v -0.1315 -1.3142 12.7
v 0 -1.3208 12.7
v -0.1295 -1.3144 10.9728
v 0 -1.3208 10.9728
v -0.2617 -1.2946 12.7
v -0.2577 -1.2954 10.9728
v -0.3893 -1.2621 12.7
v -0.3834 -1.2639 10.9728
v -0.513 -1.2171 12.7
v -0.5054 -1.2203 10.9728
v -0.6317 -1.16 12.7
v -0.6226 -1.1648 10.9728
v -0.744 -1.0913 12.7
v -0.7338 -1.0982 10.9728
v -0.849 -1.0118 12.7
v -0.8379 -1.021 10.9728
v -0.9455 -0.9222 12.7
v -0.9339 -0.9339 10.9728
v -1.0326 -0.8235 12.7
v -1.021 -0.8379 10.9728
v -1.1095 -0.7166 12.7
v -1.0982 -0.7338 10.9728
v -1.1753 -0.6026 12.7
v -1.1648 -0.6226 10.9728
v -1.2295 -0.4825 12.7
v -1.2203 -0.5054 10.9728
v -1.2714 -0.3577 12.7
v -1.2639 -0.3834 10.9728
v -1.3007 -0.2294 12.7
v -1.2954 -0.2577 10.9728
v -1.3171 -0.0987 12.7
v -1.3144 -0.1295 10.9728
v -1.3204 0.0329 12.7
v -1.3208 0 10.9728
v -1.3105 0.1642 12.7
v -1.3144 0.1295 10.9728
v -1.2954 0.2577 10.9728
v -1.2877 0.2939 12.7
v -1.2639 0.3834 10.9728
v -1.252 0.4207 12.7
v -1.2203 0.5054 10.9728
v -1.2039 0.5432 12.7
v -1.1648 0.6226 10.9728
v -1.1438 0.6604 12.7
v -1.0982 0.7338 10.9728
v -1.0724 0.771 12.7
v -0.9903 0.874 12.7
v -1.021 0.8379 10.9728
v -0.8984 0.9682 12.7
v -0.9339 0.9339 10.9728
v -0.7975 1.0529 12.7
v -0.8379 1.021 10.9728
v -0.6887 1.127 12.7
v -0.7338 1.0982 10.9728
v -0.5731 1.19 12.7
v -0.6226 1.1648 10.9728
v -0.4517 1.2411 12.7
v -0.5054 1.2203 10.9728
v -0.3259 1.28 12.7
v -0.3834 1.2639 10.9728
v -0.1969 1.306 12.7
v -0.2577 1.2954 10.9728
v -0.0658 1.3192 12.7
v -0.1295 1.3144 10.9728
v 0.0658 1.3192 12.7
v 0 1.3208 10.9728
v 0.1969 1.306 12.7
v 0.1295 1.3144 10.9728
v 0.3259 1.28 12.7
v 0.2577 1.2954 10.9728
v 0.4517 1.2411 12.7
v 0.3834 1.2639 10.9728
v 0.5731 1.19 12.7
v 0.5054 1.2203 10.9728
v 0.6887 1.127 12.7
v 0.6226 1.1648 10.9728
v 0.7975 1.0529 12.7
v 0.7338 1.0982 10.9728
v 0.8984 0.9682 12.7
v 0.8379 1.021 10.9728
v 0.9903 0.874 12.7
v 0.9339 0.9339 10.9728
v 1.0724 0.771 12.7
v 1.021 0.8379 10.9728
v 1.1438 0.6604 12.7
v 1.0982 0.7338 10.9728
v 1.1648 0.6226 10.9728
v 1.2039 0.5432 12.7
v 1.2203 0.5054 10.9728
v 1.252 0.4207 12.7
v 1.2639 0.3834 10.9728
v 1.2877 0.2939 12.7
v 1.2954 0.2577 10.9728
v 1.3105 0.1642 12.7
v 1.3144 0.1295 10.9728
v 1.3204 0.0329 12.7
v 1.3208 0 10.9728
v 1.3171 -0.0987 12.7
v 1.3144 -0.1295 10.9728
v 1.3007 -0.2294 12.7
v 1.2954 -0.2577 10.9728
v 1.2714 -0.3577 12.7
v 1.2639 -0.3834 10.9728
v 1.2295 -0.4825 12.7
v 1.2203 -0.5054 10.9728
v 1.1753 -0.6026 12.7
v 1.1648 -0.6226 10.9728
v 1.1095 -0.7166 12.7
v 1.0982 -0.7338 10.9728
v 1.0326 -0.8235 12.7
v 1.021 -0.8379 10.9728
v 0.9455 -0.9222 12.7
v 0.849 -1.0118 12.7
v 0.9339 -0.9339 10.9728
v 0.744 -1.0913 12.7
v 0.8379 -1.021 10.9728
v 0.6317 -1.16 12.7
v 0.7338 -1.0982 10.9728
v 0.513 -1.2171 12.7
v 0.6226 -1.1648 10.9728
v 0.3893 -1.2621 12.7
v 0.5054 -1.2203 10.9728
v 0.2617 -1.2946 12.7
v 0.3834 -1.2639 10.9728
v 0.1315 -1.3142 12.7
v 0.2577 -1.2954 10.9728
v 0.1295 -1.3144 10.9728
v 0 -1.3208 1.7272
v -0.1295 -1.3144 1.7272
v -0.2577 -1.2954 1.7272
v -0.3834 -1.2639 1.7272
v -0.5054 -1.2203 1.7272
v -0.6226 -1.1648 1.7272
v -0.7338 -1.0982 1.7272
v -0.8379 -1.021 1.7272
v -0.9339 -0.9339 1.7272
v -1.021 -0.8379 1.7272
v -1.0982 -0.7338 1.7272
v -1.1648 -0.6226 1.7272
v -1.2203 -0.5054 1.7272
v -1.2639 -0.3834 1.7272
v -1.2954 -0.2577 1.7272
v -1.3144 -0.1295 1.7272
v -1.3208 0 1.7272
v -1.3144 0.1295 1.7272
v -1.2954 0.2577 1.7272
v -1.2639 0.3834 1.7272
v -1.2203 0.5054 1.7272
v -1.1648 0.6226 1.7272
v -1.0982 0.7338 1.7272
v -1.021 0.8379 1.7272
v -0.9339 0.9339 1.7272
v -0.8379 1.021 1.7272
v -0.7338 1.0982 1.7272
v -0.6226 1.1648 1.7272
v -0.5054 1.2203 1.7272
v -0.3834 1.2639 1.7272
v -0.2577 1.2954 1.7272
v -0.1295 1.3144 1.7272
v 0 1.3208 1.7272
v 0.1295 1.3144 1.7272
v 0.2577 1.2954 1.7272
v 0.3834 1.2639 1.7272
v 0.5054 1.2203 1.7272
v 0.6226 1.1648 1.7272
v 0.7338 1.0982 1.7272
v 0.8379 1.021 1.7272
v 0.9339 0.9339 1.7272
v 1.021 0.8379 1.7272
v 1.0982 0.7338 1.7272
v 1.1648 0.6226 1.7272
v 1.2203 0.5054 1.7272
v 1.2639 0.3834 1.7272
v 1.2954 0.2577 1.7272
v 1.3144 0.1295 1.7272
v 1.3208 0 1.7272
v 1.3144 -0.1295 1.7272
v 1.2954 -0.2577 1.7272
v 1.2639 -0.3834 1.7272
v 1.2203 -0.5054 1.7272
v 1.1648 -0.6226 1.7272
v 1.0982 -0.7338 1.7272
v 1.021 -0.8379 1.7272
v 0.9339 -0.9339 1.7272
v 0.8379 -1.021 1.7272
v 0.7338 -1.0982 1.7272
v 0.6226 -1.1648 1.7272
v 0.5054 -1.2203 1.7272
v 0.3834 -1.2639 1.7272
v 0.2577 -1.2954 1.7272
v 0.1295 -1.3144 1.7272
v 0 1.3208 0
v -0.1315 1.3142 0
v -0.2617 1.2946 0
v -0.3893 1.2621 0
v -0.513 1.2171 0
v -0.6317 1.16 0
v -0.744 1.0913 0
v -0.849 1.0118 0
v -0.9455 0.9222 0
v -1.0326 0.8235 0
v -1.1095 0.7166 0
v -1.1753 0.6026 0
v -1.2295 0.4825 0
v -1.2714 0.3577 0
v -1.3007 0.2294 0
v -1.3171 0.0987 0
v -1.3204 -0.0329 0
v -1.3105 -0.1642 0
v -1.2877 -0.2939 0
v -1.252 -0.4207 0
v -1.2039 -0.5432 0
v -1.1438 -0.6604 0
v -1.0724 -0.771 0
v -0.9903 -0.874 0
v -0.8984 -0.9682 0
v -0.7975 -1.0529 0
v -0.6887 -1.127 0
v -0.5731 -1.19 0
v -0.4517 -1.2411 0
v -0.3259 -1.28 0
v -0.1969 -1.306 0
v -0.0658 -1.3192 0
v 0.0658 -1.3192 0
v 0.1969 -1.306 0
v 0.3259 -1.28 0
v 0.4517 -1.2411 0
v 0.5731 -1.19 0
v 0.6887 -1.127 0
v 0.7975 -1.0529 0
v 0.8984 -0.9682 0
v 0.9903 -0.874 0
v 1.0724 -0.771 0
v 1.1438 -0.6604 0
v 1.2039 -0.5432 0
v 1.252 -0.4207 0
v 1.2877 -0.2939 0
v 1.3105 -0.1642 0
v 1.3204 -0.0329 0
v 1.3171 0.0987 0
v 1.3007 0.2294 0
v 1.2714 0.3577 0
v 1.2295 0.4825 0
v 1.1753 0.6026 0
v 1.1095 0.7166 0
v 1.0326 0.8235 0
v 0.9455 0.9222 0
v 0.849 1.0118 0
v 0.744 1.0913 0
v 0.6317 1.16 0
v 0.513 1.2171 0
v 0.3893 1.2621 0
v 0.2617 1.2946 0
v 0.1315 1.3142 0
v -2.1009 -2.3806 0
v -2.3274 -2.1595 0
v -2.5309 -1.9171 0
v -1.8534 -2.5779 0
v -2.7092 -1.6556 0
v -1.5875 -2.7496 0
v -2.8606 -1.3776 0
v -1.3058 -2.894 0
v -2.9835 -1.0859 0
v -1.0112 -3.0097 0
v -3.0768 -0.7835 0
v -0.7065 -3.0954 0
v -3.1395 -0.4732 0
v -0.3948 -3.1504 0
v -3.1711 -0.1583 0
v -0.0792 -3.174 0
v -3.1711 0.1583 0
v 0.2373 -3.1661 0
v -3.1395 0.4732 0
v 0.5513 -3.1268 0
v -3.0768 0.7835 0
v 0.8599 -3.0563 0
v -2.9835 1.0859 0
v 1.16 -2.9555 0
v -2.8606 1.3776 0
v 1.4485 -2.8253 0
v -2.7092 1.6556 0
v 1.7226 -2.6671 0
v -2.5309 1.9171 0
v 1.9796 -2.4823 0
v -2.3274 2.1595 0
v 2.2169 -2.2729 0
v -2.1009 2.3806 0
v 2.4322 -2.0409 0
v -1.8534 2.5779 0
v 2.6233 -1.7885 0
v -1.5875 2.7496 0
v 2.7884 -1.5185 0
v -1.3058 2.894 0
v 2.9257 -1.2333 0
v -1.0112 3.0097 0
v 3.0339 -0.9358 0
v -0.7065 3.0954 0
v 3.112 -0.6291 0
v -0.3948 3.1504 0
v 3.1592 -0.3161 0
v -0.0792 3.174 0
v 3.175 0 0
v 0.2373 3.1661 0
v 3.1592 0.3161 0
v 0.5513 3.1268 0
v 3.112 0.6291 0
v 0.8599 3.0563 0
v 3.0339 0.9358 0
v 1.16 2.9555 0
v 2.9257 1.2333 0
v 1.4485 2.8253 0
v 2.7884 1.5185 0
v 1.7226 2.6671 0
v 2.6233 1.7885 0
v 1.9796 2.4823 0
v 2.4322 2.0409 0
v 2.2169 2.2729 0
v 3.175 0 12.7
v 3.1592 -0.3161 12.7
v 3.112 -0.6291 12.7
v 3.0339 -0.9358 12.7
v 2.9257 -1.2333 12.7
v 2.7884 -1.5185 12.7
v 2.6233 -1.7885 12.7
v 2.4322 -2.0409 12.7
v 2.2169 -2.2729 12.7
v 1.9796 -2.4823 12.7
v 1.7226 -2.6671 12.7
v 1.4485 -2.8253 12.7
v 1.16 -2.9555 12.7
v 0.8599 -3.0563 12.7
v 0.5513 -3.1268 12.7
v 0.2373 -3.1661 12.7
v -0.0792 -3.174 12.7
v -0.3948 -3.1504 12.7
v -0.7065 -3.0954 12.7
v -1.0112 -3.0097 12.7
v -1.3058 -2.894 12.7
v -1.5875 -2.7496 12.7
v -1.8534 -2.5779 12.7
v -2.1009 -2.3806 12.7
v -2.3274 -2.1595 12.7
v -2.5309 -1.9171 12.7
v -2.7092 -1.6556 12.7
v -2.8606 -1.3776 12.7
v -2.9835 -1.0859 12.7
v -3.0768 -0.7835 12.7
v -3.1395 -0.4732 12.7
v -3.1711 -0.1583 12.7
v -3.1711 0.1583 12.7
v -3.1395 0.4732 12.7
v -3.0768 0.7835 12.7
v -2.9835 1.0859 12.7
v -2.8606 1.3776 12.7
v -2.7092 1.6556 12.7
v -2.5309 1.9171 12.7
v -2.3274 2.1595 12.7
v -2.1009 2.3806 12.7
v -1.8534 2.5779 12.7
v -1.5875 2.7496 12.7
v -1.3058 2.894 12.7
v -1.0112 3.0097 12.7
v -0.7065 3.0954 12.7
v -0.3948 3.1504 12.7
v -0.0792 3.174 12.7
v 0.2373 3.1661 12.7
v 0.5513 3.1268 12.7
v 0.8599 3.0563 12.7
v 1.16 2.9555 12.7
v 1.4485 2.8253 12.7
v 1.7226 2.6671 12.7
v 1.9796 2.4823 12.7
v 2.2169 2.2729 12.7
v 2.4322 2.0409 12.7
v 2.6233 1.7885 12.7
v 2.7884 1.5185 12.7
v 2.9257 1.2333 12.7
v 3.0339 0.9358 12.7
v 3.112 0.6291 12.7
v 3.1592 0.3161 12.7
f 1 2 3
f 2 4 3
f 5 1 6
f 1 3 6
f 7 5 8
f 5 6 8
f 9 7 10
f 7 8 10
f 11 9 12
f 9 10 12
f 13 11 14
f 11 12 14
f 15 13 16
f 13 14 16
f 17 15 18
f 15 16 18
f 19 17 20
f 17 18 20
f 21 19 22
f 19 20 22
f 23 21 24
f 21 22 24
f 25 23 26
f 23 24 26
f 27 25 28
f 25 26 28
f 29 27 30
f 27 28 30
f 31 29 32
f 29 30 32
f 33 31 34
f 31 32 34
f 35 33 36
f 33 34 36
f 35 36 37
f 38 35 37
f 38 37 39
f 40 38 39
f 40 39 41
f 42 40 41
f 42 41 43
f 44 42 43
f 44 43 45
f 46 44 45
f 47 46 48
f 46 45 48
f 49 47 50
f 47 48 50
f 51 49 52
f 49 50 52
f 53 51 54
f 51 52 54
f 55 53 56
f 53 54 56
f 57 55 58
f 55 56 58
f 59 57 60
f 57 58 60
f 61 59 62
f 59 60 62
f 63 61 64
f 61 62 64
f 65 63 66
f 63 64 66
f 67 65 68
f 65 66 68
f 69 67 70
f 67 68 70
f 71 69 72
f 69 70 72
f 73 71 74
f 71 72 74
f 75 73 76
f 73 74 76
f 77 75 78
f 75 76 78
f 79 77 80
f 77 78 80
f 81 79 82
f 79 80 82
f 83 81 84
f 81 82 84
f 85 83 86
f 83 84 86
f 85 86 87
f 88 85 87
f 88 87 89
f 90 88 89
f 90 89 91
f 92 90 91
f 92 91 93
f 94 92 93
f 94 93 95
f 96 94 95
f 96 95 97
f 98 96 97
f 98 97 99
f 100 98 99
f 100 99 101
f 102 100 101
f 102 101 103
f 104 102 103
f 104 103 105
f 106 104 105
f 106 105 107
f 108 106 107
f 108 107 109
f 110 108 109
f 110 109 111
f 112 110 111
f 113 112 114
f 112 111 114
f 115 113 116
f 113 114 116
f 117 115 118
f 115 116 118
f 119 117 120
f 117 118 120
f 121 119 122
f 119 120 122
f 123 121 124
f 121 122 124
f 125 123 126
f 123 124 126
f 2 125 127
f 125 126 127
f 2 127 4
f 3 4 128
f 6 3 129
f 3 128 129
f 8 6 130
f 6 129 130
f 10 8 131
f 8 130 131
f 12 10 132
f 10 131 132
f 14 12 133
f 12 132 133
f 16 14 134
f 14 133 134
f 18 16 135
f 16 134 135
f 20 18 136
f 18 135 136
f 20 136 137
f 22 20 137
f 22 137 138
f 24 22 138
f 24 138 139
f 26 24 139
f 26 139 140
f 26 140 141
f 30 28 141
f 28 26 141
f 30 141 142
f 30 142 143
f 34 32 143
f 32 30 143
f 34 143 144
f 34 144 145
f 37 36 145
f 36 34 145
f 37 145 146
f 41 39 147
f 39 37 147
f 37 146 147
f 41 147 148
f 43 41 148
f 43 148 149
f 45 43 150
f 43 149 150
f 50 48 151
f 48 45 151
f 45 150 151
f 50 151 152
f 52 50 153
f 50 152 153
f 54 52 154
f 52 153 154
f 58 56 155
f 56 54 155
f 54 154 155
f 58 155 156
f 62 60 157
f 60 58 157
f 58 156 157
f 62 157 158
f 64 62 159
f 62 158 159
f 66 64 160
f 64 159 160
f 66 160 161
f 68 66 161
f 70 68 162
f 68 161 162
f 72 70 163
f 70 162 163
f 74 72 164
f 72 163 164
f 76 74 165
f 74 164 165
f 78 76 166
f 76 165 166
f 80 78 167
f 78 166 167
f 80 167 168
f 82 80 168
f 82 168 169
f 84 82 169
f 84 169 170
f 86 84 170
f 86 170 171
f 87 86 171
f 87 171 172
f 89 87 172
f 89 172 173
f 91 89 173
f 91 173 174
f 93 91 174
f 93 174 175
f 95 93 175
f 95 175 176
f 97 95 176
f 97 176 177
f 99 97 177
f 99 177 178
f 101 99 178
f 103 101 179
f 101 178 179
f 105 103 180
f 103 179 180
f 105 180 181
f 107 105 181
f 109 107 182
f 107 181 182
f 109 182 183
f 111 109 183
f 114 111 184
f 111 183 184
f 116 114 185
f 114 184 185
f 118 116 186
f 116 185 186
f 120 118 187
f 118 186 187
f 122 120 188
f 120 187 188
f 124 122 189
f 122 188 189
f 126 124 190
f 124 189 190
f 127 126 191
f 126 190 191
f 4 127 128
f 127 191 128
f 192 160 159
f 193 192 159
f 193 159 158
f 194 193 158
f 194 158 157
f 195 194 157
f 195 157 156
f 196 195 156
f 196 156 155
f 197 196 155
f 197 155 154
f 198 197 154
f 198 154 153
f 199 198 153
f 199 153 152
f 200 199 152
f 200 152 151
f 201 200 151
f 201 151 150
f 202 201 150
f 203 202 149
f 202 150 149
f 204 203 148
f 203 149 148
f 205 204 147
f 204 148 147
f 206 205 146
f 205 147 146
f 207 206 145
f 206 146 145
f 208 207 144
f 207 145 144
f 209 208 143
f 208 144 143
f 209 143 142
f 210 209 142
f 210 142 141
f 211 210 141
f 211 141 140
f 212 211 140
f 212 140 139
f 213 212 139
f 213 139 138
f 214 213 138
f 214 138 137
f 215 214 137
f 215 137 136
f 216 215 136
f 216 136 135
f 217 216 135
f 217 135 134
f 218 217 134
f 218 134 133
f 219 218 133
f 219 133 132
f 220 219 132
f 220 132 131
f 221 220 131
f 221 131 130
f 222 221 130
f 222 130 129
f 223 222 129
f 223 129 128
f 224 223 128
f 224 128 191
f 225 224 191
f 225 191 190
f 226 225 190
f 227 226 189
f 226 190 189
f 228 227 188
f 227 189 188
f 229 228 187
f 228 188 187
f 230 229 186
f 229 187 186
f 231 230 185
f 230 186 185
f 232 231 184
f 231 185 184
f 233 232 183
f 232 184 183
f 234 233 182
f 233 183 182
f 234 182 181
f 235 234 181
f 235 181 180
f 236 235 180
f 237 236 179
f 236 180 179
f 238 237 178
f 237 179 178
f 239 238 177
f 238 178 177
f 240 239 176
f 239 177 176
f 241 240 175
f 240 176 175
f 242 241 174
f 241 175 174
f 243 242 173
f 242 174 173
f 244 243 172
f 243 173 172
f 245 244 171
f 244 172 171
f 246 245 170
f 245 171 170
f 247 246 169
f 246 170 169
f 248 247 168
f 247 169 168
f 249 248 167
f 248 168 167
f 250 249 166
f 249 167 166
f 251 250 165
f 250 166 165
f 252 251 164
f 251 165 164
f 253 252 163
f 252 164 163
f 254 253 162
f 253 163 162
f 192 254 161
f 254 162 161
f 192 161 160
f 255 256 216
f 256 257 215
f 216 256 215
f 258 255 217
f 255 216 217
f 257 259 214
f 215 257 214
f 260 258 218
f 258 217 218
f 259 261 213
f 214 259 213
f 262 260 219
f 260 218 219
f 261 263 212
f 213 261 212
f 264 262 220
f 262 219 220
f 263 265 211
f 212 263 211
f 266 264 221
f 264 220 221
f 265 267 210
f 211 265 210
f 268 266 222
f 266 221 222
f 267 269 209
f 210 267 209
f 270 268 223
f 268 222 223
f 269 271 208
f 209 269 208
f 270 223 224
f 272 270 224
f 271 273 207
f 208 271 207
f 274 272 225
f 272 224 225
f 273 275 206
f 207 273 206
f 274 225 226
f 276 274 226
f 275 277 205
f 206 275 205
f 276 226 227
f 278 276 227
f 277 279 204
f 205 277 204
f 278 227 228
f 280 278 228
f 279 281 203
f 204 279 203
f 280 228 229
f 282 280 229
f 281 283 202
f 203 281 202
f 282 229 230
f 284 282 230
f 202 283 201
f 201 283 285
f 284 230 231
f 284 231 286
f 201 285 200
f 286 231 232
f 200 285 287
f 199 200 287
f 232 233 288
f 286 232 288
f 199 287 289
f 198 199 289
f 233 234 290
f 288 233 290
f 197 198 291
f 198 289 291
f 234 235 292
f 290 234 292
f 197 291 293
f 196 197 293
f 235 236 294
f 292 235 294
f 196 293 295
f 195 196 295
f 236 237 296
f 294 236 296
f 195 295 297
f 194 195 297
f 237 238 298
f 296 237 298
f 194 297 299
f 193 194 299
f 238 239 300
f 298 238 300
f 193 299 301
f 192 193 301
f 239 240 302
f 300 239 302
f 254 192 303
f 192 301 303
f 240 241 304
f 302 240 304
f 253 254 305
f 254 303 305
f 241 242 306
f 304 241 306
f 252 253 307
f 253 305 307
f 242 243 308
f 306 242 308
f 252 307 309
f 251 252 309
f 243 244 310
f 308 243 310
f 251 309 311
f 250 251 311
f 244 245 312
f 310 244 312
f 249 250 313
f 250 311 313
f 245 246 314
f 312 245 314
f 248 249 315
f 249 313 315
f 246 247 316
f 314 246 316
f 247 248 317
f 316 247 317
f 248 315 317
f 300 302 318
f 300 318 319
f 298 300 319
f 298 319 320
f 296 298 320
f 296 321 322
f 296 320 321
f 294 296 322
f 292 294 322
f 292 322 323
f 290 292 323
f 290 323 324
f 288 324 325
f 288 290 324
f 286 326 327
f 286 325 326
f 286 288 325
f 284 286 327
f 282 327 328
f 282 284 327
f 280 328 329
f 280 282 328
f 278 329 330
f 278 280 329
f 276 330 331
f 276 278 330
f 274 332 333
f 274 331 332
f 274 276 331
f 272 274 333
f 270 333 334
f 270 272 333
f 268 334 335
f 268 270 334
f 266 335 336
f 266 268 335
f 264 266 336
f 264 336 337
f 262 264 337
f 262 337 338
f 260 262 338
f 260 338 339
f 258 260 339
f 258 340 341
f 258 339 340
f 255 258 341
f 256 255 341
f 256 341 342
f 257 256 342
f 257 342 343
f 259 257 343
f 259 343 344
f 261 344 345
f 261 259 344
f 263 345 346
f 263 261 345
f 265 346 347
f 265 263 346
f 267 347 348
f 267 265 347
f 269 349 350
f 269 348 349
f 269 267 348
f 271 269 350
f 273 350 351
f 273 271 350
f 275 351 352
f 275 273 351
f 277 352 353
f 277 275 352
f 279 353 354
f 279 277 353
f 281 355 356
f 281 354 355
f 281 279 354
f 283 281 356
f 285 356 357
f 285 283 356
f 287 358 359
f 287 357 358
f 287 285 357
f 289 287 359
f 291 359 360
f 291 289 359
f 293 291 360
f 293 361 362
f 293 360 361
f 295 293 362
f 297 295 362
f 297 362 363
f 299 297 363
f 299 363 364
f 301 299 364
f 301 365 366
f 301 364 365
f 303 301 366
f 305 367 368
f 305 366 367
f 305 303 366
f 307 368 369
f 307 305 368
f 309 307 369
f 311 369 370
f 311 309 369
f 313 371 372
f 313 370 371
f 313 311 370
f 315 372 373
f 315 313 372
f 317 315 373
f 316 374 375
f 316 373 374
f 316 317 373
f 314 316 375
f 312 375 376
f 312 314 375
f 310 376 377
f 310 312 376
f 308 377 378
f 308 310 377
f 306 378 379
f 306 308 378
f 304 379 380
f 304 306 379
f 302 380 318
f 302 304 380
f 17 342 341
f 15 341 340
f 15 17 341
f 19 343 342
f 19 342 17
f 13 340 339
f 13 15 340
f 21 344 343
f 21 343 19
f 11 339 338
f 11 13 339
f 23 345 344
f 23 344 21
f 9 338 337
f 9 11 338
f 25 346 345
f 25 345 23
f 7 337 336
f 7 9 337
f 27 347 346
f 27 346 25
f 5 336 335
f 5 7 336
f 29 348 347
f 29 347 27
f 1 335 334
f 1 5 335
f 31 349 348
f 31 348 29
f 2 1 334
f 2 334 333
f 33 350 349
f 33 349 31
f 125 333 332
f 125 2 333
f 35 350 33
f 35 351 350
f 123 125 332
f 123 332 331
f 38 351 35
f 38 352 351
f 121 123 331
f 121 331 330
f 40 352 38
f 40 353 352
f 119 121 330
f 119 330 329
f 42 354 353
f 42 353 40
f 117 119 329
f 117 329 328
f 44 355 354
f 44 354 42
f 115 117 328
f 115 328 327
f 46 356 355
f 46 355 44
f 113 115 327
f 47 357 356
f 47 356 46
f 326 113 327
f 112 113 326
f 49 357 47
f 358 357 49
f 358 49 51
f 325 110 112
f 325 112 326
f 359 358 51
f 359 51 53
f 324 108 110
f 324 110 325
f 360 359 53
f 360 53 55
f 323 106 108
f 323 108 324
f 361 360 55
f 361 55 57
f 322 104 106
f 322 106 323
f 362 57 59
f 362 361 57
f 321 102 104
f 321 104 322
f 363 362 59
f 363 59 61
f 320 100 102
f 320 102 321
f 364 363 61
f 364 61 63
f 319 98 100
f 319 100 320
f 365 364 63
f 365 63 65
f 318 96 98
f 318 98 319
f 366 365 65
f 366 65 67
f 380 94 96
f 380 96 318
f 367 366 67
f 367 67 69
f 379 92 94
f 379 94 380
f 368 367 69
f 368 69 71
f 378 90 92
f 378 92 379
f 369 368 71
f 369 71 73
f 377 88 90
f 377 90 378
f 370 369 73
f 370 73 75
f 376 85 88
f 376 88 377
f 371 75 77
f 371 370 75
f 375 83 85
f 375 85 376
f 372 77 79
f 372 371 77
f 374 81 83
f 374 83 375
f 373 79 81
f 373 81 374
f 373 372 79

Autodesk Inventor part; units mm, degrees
ref_plane "YZ Plane" through (0, 0, 0) normal (1, 0, 0) x (0, 1, 0)
ref_plane "XZ Plane" through (0, 0, 0) normal (0, 1, 0) x (-1, 0, 0)
ref_plane "XY Plane" through (0, 0, 0) normal (0, 0, 1) x (1, 0, 0)
sketch "Sketch1" plane through (0, 0, 0) normal (0, 0, 1) x (1, 0, 0)
  circle A0 centre (0, 0) radius 3.175
  dimension "d0" = 6.35
extrude "Extrusion1" add sketch "Sketch1" along normal blind 12.7
sketch "Sketch2" plane through (0, 0, 12.7) normal (0, 0, 1) x (1, 0, 0)
  point P0 (0, 0)
  point P1 (0, 0)
hole "Hole1" at (0, 0, 12.7) direction (0, 0, -1) diameter 2.6416 depth 10.9728 tip angle 118 thread size "6-32 UNC" class "2B" standard "ANSI Unified Screw Threads"
sketch "Sketch3" plane through (0, 0, 0) normal (0, 0, -1) x (-1, 0, 0)
  point P0 (0, 0)
  point P1 (0, 0)
hole "Hole2" at (0, 0, 0) at (0, 0, 0) direction (0, 0, 1) diameter 2.6416 depth 10.9728 tip angle 118 thread size "6-32 UNC" class "2B" standard "ANSI Unified Screw Threads"
properties part number "Standoff"
